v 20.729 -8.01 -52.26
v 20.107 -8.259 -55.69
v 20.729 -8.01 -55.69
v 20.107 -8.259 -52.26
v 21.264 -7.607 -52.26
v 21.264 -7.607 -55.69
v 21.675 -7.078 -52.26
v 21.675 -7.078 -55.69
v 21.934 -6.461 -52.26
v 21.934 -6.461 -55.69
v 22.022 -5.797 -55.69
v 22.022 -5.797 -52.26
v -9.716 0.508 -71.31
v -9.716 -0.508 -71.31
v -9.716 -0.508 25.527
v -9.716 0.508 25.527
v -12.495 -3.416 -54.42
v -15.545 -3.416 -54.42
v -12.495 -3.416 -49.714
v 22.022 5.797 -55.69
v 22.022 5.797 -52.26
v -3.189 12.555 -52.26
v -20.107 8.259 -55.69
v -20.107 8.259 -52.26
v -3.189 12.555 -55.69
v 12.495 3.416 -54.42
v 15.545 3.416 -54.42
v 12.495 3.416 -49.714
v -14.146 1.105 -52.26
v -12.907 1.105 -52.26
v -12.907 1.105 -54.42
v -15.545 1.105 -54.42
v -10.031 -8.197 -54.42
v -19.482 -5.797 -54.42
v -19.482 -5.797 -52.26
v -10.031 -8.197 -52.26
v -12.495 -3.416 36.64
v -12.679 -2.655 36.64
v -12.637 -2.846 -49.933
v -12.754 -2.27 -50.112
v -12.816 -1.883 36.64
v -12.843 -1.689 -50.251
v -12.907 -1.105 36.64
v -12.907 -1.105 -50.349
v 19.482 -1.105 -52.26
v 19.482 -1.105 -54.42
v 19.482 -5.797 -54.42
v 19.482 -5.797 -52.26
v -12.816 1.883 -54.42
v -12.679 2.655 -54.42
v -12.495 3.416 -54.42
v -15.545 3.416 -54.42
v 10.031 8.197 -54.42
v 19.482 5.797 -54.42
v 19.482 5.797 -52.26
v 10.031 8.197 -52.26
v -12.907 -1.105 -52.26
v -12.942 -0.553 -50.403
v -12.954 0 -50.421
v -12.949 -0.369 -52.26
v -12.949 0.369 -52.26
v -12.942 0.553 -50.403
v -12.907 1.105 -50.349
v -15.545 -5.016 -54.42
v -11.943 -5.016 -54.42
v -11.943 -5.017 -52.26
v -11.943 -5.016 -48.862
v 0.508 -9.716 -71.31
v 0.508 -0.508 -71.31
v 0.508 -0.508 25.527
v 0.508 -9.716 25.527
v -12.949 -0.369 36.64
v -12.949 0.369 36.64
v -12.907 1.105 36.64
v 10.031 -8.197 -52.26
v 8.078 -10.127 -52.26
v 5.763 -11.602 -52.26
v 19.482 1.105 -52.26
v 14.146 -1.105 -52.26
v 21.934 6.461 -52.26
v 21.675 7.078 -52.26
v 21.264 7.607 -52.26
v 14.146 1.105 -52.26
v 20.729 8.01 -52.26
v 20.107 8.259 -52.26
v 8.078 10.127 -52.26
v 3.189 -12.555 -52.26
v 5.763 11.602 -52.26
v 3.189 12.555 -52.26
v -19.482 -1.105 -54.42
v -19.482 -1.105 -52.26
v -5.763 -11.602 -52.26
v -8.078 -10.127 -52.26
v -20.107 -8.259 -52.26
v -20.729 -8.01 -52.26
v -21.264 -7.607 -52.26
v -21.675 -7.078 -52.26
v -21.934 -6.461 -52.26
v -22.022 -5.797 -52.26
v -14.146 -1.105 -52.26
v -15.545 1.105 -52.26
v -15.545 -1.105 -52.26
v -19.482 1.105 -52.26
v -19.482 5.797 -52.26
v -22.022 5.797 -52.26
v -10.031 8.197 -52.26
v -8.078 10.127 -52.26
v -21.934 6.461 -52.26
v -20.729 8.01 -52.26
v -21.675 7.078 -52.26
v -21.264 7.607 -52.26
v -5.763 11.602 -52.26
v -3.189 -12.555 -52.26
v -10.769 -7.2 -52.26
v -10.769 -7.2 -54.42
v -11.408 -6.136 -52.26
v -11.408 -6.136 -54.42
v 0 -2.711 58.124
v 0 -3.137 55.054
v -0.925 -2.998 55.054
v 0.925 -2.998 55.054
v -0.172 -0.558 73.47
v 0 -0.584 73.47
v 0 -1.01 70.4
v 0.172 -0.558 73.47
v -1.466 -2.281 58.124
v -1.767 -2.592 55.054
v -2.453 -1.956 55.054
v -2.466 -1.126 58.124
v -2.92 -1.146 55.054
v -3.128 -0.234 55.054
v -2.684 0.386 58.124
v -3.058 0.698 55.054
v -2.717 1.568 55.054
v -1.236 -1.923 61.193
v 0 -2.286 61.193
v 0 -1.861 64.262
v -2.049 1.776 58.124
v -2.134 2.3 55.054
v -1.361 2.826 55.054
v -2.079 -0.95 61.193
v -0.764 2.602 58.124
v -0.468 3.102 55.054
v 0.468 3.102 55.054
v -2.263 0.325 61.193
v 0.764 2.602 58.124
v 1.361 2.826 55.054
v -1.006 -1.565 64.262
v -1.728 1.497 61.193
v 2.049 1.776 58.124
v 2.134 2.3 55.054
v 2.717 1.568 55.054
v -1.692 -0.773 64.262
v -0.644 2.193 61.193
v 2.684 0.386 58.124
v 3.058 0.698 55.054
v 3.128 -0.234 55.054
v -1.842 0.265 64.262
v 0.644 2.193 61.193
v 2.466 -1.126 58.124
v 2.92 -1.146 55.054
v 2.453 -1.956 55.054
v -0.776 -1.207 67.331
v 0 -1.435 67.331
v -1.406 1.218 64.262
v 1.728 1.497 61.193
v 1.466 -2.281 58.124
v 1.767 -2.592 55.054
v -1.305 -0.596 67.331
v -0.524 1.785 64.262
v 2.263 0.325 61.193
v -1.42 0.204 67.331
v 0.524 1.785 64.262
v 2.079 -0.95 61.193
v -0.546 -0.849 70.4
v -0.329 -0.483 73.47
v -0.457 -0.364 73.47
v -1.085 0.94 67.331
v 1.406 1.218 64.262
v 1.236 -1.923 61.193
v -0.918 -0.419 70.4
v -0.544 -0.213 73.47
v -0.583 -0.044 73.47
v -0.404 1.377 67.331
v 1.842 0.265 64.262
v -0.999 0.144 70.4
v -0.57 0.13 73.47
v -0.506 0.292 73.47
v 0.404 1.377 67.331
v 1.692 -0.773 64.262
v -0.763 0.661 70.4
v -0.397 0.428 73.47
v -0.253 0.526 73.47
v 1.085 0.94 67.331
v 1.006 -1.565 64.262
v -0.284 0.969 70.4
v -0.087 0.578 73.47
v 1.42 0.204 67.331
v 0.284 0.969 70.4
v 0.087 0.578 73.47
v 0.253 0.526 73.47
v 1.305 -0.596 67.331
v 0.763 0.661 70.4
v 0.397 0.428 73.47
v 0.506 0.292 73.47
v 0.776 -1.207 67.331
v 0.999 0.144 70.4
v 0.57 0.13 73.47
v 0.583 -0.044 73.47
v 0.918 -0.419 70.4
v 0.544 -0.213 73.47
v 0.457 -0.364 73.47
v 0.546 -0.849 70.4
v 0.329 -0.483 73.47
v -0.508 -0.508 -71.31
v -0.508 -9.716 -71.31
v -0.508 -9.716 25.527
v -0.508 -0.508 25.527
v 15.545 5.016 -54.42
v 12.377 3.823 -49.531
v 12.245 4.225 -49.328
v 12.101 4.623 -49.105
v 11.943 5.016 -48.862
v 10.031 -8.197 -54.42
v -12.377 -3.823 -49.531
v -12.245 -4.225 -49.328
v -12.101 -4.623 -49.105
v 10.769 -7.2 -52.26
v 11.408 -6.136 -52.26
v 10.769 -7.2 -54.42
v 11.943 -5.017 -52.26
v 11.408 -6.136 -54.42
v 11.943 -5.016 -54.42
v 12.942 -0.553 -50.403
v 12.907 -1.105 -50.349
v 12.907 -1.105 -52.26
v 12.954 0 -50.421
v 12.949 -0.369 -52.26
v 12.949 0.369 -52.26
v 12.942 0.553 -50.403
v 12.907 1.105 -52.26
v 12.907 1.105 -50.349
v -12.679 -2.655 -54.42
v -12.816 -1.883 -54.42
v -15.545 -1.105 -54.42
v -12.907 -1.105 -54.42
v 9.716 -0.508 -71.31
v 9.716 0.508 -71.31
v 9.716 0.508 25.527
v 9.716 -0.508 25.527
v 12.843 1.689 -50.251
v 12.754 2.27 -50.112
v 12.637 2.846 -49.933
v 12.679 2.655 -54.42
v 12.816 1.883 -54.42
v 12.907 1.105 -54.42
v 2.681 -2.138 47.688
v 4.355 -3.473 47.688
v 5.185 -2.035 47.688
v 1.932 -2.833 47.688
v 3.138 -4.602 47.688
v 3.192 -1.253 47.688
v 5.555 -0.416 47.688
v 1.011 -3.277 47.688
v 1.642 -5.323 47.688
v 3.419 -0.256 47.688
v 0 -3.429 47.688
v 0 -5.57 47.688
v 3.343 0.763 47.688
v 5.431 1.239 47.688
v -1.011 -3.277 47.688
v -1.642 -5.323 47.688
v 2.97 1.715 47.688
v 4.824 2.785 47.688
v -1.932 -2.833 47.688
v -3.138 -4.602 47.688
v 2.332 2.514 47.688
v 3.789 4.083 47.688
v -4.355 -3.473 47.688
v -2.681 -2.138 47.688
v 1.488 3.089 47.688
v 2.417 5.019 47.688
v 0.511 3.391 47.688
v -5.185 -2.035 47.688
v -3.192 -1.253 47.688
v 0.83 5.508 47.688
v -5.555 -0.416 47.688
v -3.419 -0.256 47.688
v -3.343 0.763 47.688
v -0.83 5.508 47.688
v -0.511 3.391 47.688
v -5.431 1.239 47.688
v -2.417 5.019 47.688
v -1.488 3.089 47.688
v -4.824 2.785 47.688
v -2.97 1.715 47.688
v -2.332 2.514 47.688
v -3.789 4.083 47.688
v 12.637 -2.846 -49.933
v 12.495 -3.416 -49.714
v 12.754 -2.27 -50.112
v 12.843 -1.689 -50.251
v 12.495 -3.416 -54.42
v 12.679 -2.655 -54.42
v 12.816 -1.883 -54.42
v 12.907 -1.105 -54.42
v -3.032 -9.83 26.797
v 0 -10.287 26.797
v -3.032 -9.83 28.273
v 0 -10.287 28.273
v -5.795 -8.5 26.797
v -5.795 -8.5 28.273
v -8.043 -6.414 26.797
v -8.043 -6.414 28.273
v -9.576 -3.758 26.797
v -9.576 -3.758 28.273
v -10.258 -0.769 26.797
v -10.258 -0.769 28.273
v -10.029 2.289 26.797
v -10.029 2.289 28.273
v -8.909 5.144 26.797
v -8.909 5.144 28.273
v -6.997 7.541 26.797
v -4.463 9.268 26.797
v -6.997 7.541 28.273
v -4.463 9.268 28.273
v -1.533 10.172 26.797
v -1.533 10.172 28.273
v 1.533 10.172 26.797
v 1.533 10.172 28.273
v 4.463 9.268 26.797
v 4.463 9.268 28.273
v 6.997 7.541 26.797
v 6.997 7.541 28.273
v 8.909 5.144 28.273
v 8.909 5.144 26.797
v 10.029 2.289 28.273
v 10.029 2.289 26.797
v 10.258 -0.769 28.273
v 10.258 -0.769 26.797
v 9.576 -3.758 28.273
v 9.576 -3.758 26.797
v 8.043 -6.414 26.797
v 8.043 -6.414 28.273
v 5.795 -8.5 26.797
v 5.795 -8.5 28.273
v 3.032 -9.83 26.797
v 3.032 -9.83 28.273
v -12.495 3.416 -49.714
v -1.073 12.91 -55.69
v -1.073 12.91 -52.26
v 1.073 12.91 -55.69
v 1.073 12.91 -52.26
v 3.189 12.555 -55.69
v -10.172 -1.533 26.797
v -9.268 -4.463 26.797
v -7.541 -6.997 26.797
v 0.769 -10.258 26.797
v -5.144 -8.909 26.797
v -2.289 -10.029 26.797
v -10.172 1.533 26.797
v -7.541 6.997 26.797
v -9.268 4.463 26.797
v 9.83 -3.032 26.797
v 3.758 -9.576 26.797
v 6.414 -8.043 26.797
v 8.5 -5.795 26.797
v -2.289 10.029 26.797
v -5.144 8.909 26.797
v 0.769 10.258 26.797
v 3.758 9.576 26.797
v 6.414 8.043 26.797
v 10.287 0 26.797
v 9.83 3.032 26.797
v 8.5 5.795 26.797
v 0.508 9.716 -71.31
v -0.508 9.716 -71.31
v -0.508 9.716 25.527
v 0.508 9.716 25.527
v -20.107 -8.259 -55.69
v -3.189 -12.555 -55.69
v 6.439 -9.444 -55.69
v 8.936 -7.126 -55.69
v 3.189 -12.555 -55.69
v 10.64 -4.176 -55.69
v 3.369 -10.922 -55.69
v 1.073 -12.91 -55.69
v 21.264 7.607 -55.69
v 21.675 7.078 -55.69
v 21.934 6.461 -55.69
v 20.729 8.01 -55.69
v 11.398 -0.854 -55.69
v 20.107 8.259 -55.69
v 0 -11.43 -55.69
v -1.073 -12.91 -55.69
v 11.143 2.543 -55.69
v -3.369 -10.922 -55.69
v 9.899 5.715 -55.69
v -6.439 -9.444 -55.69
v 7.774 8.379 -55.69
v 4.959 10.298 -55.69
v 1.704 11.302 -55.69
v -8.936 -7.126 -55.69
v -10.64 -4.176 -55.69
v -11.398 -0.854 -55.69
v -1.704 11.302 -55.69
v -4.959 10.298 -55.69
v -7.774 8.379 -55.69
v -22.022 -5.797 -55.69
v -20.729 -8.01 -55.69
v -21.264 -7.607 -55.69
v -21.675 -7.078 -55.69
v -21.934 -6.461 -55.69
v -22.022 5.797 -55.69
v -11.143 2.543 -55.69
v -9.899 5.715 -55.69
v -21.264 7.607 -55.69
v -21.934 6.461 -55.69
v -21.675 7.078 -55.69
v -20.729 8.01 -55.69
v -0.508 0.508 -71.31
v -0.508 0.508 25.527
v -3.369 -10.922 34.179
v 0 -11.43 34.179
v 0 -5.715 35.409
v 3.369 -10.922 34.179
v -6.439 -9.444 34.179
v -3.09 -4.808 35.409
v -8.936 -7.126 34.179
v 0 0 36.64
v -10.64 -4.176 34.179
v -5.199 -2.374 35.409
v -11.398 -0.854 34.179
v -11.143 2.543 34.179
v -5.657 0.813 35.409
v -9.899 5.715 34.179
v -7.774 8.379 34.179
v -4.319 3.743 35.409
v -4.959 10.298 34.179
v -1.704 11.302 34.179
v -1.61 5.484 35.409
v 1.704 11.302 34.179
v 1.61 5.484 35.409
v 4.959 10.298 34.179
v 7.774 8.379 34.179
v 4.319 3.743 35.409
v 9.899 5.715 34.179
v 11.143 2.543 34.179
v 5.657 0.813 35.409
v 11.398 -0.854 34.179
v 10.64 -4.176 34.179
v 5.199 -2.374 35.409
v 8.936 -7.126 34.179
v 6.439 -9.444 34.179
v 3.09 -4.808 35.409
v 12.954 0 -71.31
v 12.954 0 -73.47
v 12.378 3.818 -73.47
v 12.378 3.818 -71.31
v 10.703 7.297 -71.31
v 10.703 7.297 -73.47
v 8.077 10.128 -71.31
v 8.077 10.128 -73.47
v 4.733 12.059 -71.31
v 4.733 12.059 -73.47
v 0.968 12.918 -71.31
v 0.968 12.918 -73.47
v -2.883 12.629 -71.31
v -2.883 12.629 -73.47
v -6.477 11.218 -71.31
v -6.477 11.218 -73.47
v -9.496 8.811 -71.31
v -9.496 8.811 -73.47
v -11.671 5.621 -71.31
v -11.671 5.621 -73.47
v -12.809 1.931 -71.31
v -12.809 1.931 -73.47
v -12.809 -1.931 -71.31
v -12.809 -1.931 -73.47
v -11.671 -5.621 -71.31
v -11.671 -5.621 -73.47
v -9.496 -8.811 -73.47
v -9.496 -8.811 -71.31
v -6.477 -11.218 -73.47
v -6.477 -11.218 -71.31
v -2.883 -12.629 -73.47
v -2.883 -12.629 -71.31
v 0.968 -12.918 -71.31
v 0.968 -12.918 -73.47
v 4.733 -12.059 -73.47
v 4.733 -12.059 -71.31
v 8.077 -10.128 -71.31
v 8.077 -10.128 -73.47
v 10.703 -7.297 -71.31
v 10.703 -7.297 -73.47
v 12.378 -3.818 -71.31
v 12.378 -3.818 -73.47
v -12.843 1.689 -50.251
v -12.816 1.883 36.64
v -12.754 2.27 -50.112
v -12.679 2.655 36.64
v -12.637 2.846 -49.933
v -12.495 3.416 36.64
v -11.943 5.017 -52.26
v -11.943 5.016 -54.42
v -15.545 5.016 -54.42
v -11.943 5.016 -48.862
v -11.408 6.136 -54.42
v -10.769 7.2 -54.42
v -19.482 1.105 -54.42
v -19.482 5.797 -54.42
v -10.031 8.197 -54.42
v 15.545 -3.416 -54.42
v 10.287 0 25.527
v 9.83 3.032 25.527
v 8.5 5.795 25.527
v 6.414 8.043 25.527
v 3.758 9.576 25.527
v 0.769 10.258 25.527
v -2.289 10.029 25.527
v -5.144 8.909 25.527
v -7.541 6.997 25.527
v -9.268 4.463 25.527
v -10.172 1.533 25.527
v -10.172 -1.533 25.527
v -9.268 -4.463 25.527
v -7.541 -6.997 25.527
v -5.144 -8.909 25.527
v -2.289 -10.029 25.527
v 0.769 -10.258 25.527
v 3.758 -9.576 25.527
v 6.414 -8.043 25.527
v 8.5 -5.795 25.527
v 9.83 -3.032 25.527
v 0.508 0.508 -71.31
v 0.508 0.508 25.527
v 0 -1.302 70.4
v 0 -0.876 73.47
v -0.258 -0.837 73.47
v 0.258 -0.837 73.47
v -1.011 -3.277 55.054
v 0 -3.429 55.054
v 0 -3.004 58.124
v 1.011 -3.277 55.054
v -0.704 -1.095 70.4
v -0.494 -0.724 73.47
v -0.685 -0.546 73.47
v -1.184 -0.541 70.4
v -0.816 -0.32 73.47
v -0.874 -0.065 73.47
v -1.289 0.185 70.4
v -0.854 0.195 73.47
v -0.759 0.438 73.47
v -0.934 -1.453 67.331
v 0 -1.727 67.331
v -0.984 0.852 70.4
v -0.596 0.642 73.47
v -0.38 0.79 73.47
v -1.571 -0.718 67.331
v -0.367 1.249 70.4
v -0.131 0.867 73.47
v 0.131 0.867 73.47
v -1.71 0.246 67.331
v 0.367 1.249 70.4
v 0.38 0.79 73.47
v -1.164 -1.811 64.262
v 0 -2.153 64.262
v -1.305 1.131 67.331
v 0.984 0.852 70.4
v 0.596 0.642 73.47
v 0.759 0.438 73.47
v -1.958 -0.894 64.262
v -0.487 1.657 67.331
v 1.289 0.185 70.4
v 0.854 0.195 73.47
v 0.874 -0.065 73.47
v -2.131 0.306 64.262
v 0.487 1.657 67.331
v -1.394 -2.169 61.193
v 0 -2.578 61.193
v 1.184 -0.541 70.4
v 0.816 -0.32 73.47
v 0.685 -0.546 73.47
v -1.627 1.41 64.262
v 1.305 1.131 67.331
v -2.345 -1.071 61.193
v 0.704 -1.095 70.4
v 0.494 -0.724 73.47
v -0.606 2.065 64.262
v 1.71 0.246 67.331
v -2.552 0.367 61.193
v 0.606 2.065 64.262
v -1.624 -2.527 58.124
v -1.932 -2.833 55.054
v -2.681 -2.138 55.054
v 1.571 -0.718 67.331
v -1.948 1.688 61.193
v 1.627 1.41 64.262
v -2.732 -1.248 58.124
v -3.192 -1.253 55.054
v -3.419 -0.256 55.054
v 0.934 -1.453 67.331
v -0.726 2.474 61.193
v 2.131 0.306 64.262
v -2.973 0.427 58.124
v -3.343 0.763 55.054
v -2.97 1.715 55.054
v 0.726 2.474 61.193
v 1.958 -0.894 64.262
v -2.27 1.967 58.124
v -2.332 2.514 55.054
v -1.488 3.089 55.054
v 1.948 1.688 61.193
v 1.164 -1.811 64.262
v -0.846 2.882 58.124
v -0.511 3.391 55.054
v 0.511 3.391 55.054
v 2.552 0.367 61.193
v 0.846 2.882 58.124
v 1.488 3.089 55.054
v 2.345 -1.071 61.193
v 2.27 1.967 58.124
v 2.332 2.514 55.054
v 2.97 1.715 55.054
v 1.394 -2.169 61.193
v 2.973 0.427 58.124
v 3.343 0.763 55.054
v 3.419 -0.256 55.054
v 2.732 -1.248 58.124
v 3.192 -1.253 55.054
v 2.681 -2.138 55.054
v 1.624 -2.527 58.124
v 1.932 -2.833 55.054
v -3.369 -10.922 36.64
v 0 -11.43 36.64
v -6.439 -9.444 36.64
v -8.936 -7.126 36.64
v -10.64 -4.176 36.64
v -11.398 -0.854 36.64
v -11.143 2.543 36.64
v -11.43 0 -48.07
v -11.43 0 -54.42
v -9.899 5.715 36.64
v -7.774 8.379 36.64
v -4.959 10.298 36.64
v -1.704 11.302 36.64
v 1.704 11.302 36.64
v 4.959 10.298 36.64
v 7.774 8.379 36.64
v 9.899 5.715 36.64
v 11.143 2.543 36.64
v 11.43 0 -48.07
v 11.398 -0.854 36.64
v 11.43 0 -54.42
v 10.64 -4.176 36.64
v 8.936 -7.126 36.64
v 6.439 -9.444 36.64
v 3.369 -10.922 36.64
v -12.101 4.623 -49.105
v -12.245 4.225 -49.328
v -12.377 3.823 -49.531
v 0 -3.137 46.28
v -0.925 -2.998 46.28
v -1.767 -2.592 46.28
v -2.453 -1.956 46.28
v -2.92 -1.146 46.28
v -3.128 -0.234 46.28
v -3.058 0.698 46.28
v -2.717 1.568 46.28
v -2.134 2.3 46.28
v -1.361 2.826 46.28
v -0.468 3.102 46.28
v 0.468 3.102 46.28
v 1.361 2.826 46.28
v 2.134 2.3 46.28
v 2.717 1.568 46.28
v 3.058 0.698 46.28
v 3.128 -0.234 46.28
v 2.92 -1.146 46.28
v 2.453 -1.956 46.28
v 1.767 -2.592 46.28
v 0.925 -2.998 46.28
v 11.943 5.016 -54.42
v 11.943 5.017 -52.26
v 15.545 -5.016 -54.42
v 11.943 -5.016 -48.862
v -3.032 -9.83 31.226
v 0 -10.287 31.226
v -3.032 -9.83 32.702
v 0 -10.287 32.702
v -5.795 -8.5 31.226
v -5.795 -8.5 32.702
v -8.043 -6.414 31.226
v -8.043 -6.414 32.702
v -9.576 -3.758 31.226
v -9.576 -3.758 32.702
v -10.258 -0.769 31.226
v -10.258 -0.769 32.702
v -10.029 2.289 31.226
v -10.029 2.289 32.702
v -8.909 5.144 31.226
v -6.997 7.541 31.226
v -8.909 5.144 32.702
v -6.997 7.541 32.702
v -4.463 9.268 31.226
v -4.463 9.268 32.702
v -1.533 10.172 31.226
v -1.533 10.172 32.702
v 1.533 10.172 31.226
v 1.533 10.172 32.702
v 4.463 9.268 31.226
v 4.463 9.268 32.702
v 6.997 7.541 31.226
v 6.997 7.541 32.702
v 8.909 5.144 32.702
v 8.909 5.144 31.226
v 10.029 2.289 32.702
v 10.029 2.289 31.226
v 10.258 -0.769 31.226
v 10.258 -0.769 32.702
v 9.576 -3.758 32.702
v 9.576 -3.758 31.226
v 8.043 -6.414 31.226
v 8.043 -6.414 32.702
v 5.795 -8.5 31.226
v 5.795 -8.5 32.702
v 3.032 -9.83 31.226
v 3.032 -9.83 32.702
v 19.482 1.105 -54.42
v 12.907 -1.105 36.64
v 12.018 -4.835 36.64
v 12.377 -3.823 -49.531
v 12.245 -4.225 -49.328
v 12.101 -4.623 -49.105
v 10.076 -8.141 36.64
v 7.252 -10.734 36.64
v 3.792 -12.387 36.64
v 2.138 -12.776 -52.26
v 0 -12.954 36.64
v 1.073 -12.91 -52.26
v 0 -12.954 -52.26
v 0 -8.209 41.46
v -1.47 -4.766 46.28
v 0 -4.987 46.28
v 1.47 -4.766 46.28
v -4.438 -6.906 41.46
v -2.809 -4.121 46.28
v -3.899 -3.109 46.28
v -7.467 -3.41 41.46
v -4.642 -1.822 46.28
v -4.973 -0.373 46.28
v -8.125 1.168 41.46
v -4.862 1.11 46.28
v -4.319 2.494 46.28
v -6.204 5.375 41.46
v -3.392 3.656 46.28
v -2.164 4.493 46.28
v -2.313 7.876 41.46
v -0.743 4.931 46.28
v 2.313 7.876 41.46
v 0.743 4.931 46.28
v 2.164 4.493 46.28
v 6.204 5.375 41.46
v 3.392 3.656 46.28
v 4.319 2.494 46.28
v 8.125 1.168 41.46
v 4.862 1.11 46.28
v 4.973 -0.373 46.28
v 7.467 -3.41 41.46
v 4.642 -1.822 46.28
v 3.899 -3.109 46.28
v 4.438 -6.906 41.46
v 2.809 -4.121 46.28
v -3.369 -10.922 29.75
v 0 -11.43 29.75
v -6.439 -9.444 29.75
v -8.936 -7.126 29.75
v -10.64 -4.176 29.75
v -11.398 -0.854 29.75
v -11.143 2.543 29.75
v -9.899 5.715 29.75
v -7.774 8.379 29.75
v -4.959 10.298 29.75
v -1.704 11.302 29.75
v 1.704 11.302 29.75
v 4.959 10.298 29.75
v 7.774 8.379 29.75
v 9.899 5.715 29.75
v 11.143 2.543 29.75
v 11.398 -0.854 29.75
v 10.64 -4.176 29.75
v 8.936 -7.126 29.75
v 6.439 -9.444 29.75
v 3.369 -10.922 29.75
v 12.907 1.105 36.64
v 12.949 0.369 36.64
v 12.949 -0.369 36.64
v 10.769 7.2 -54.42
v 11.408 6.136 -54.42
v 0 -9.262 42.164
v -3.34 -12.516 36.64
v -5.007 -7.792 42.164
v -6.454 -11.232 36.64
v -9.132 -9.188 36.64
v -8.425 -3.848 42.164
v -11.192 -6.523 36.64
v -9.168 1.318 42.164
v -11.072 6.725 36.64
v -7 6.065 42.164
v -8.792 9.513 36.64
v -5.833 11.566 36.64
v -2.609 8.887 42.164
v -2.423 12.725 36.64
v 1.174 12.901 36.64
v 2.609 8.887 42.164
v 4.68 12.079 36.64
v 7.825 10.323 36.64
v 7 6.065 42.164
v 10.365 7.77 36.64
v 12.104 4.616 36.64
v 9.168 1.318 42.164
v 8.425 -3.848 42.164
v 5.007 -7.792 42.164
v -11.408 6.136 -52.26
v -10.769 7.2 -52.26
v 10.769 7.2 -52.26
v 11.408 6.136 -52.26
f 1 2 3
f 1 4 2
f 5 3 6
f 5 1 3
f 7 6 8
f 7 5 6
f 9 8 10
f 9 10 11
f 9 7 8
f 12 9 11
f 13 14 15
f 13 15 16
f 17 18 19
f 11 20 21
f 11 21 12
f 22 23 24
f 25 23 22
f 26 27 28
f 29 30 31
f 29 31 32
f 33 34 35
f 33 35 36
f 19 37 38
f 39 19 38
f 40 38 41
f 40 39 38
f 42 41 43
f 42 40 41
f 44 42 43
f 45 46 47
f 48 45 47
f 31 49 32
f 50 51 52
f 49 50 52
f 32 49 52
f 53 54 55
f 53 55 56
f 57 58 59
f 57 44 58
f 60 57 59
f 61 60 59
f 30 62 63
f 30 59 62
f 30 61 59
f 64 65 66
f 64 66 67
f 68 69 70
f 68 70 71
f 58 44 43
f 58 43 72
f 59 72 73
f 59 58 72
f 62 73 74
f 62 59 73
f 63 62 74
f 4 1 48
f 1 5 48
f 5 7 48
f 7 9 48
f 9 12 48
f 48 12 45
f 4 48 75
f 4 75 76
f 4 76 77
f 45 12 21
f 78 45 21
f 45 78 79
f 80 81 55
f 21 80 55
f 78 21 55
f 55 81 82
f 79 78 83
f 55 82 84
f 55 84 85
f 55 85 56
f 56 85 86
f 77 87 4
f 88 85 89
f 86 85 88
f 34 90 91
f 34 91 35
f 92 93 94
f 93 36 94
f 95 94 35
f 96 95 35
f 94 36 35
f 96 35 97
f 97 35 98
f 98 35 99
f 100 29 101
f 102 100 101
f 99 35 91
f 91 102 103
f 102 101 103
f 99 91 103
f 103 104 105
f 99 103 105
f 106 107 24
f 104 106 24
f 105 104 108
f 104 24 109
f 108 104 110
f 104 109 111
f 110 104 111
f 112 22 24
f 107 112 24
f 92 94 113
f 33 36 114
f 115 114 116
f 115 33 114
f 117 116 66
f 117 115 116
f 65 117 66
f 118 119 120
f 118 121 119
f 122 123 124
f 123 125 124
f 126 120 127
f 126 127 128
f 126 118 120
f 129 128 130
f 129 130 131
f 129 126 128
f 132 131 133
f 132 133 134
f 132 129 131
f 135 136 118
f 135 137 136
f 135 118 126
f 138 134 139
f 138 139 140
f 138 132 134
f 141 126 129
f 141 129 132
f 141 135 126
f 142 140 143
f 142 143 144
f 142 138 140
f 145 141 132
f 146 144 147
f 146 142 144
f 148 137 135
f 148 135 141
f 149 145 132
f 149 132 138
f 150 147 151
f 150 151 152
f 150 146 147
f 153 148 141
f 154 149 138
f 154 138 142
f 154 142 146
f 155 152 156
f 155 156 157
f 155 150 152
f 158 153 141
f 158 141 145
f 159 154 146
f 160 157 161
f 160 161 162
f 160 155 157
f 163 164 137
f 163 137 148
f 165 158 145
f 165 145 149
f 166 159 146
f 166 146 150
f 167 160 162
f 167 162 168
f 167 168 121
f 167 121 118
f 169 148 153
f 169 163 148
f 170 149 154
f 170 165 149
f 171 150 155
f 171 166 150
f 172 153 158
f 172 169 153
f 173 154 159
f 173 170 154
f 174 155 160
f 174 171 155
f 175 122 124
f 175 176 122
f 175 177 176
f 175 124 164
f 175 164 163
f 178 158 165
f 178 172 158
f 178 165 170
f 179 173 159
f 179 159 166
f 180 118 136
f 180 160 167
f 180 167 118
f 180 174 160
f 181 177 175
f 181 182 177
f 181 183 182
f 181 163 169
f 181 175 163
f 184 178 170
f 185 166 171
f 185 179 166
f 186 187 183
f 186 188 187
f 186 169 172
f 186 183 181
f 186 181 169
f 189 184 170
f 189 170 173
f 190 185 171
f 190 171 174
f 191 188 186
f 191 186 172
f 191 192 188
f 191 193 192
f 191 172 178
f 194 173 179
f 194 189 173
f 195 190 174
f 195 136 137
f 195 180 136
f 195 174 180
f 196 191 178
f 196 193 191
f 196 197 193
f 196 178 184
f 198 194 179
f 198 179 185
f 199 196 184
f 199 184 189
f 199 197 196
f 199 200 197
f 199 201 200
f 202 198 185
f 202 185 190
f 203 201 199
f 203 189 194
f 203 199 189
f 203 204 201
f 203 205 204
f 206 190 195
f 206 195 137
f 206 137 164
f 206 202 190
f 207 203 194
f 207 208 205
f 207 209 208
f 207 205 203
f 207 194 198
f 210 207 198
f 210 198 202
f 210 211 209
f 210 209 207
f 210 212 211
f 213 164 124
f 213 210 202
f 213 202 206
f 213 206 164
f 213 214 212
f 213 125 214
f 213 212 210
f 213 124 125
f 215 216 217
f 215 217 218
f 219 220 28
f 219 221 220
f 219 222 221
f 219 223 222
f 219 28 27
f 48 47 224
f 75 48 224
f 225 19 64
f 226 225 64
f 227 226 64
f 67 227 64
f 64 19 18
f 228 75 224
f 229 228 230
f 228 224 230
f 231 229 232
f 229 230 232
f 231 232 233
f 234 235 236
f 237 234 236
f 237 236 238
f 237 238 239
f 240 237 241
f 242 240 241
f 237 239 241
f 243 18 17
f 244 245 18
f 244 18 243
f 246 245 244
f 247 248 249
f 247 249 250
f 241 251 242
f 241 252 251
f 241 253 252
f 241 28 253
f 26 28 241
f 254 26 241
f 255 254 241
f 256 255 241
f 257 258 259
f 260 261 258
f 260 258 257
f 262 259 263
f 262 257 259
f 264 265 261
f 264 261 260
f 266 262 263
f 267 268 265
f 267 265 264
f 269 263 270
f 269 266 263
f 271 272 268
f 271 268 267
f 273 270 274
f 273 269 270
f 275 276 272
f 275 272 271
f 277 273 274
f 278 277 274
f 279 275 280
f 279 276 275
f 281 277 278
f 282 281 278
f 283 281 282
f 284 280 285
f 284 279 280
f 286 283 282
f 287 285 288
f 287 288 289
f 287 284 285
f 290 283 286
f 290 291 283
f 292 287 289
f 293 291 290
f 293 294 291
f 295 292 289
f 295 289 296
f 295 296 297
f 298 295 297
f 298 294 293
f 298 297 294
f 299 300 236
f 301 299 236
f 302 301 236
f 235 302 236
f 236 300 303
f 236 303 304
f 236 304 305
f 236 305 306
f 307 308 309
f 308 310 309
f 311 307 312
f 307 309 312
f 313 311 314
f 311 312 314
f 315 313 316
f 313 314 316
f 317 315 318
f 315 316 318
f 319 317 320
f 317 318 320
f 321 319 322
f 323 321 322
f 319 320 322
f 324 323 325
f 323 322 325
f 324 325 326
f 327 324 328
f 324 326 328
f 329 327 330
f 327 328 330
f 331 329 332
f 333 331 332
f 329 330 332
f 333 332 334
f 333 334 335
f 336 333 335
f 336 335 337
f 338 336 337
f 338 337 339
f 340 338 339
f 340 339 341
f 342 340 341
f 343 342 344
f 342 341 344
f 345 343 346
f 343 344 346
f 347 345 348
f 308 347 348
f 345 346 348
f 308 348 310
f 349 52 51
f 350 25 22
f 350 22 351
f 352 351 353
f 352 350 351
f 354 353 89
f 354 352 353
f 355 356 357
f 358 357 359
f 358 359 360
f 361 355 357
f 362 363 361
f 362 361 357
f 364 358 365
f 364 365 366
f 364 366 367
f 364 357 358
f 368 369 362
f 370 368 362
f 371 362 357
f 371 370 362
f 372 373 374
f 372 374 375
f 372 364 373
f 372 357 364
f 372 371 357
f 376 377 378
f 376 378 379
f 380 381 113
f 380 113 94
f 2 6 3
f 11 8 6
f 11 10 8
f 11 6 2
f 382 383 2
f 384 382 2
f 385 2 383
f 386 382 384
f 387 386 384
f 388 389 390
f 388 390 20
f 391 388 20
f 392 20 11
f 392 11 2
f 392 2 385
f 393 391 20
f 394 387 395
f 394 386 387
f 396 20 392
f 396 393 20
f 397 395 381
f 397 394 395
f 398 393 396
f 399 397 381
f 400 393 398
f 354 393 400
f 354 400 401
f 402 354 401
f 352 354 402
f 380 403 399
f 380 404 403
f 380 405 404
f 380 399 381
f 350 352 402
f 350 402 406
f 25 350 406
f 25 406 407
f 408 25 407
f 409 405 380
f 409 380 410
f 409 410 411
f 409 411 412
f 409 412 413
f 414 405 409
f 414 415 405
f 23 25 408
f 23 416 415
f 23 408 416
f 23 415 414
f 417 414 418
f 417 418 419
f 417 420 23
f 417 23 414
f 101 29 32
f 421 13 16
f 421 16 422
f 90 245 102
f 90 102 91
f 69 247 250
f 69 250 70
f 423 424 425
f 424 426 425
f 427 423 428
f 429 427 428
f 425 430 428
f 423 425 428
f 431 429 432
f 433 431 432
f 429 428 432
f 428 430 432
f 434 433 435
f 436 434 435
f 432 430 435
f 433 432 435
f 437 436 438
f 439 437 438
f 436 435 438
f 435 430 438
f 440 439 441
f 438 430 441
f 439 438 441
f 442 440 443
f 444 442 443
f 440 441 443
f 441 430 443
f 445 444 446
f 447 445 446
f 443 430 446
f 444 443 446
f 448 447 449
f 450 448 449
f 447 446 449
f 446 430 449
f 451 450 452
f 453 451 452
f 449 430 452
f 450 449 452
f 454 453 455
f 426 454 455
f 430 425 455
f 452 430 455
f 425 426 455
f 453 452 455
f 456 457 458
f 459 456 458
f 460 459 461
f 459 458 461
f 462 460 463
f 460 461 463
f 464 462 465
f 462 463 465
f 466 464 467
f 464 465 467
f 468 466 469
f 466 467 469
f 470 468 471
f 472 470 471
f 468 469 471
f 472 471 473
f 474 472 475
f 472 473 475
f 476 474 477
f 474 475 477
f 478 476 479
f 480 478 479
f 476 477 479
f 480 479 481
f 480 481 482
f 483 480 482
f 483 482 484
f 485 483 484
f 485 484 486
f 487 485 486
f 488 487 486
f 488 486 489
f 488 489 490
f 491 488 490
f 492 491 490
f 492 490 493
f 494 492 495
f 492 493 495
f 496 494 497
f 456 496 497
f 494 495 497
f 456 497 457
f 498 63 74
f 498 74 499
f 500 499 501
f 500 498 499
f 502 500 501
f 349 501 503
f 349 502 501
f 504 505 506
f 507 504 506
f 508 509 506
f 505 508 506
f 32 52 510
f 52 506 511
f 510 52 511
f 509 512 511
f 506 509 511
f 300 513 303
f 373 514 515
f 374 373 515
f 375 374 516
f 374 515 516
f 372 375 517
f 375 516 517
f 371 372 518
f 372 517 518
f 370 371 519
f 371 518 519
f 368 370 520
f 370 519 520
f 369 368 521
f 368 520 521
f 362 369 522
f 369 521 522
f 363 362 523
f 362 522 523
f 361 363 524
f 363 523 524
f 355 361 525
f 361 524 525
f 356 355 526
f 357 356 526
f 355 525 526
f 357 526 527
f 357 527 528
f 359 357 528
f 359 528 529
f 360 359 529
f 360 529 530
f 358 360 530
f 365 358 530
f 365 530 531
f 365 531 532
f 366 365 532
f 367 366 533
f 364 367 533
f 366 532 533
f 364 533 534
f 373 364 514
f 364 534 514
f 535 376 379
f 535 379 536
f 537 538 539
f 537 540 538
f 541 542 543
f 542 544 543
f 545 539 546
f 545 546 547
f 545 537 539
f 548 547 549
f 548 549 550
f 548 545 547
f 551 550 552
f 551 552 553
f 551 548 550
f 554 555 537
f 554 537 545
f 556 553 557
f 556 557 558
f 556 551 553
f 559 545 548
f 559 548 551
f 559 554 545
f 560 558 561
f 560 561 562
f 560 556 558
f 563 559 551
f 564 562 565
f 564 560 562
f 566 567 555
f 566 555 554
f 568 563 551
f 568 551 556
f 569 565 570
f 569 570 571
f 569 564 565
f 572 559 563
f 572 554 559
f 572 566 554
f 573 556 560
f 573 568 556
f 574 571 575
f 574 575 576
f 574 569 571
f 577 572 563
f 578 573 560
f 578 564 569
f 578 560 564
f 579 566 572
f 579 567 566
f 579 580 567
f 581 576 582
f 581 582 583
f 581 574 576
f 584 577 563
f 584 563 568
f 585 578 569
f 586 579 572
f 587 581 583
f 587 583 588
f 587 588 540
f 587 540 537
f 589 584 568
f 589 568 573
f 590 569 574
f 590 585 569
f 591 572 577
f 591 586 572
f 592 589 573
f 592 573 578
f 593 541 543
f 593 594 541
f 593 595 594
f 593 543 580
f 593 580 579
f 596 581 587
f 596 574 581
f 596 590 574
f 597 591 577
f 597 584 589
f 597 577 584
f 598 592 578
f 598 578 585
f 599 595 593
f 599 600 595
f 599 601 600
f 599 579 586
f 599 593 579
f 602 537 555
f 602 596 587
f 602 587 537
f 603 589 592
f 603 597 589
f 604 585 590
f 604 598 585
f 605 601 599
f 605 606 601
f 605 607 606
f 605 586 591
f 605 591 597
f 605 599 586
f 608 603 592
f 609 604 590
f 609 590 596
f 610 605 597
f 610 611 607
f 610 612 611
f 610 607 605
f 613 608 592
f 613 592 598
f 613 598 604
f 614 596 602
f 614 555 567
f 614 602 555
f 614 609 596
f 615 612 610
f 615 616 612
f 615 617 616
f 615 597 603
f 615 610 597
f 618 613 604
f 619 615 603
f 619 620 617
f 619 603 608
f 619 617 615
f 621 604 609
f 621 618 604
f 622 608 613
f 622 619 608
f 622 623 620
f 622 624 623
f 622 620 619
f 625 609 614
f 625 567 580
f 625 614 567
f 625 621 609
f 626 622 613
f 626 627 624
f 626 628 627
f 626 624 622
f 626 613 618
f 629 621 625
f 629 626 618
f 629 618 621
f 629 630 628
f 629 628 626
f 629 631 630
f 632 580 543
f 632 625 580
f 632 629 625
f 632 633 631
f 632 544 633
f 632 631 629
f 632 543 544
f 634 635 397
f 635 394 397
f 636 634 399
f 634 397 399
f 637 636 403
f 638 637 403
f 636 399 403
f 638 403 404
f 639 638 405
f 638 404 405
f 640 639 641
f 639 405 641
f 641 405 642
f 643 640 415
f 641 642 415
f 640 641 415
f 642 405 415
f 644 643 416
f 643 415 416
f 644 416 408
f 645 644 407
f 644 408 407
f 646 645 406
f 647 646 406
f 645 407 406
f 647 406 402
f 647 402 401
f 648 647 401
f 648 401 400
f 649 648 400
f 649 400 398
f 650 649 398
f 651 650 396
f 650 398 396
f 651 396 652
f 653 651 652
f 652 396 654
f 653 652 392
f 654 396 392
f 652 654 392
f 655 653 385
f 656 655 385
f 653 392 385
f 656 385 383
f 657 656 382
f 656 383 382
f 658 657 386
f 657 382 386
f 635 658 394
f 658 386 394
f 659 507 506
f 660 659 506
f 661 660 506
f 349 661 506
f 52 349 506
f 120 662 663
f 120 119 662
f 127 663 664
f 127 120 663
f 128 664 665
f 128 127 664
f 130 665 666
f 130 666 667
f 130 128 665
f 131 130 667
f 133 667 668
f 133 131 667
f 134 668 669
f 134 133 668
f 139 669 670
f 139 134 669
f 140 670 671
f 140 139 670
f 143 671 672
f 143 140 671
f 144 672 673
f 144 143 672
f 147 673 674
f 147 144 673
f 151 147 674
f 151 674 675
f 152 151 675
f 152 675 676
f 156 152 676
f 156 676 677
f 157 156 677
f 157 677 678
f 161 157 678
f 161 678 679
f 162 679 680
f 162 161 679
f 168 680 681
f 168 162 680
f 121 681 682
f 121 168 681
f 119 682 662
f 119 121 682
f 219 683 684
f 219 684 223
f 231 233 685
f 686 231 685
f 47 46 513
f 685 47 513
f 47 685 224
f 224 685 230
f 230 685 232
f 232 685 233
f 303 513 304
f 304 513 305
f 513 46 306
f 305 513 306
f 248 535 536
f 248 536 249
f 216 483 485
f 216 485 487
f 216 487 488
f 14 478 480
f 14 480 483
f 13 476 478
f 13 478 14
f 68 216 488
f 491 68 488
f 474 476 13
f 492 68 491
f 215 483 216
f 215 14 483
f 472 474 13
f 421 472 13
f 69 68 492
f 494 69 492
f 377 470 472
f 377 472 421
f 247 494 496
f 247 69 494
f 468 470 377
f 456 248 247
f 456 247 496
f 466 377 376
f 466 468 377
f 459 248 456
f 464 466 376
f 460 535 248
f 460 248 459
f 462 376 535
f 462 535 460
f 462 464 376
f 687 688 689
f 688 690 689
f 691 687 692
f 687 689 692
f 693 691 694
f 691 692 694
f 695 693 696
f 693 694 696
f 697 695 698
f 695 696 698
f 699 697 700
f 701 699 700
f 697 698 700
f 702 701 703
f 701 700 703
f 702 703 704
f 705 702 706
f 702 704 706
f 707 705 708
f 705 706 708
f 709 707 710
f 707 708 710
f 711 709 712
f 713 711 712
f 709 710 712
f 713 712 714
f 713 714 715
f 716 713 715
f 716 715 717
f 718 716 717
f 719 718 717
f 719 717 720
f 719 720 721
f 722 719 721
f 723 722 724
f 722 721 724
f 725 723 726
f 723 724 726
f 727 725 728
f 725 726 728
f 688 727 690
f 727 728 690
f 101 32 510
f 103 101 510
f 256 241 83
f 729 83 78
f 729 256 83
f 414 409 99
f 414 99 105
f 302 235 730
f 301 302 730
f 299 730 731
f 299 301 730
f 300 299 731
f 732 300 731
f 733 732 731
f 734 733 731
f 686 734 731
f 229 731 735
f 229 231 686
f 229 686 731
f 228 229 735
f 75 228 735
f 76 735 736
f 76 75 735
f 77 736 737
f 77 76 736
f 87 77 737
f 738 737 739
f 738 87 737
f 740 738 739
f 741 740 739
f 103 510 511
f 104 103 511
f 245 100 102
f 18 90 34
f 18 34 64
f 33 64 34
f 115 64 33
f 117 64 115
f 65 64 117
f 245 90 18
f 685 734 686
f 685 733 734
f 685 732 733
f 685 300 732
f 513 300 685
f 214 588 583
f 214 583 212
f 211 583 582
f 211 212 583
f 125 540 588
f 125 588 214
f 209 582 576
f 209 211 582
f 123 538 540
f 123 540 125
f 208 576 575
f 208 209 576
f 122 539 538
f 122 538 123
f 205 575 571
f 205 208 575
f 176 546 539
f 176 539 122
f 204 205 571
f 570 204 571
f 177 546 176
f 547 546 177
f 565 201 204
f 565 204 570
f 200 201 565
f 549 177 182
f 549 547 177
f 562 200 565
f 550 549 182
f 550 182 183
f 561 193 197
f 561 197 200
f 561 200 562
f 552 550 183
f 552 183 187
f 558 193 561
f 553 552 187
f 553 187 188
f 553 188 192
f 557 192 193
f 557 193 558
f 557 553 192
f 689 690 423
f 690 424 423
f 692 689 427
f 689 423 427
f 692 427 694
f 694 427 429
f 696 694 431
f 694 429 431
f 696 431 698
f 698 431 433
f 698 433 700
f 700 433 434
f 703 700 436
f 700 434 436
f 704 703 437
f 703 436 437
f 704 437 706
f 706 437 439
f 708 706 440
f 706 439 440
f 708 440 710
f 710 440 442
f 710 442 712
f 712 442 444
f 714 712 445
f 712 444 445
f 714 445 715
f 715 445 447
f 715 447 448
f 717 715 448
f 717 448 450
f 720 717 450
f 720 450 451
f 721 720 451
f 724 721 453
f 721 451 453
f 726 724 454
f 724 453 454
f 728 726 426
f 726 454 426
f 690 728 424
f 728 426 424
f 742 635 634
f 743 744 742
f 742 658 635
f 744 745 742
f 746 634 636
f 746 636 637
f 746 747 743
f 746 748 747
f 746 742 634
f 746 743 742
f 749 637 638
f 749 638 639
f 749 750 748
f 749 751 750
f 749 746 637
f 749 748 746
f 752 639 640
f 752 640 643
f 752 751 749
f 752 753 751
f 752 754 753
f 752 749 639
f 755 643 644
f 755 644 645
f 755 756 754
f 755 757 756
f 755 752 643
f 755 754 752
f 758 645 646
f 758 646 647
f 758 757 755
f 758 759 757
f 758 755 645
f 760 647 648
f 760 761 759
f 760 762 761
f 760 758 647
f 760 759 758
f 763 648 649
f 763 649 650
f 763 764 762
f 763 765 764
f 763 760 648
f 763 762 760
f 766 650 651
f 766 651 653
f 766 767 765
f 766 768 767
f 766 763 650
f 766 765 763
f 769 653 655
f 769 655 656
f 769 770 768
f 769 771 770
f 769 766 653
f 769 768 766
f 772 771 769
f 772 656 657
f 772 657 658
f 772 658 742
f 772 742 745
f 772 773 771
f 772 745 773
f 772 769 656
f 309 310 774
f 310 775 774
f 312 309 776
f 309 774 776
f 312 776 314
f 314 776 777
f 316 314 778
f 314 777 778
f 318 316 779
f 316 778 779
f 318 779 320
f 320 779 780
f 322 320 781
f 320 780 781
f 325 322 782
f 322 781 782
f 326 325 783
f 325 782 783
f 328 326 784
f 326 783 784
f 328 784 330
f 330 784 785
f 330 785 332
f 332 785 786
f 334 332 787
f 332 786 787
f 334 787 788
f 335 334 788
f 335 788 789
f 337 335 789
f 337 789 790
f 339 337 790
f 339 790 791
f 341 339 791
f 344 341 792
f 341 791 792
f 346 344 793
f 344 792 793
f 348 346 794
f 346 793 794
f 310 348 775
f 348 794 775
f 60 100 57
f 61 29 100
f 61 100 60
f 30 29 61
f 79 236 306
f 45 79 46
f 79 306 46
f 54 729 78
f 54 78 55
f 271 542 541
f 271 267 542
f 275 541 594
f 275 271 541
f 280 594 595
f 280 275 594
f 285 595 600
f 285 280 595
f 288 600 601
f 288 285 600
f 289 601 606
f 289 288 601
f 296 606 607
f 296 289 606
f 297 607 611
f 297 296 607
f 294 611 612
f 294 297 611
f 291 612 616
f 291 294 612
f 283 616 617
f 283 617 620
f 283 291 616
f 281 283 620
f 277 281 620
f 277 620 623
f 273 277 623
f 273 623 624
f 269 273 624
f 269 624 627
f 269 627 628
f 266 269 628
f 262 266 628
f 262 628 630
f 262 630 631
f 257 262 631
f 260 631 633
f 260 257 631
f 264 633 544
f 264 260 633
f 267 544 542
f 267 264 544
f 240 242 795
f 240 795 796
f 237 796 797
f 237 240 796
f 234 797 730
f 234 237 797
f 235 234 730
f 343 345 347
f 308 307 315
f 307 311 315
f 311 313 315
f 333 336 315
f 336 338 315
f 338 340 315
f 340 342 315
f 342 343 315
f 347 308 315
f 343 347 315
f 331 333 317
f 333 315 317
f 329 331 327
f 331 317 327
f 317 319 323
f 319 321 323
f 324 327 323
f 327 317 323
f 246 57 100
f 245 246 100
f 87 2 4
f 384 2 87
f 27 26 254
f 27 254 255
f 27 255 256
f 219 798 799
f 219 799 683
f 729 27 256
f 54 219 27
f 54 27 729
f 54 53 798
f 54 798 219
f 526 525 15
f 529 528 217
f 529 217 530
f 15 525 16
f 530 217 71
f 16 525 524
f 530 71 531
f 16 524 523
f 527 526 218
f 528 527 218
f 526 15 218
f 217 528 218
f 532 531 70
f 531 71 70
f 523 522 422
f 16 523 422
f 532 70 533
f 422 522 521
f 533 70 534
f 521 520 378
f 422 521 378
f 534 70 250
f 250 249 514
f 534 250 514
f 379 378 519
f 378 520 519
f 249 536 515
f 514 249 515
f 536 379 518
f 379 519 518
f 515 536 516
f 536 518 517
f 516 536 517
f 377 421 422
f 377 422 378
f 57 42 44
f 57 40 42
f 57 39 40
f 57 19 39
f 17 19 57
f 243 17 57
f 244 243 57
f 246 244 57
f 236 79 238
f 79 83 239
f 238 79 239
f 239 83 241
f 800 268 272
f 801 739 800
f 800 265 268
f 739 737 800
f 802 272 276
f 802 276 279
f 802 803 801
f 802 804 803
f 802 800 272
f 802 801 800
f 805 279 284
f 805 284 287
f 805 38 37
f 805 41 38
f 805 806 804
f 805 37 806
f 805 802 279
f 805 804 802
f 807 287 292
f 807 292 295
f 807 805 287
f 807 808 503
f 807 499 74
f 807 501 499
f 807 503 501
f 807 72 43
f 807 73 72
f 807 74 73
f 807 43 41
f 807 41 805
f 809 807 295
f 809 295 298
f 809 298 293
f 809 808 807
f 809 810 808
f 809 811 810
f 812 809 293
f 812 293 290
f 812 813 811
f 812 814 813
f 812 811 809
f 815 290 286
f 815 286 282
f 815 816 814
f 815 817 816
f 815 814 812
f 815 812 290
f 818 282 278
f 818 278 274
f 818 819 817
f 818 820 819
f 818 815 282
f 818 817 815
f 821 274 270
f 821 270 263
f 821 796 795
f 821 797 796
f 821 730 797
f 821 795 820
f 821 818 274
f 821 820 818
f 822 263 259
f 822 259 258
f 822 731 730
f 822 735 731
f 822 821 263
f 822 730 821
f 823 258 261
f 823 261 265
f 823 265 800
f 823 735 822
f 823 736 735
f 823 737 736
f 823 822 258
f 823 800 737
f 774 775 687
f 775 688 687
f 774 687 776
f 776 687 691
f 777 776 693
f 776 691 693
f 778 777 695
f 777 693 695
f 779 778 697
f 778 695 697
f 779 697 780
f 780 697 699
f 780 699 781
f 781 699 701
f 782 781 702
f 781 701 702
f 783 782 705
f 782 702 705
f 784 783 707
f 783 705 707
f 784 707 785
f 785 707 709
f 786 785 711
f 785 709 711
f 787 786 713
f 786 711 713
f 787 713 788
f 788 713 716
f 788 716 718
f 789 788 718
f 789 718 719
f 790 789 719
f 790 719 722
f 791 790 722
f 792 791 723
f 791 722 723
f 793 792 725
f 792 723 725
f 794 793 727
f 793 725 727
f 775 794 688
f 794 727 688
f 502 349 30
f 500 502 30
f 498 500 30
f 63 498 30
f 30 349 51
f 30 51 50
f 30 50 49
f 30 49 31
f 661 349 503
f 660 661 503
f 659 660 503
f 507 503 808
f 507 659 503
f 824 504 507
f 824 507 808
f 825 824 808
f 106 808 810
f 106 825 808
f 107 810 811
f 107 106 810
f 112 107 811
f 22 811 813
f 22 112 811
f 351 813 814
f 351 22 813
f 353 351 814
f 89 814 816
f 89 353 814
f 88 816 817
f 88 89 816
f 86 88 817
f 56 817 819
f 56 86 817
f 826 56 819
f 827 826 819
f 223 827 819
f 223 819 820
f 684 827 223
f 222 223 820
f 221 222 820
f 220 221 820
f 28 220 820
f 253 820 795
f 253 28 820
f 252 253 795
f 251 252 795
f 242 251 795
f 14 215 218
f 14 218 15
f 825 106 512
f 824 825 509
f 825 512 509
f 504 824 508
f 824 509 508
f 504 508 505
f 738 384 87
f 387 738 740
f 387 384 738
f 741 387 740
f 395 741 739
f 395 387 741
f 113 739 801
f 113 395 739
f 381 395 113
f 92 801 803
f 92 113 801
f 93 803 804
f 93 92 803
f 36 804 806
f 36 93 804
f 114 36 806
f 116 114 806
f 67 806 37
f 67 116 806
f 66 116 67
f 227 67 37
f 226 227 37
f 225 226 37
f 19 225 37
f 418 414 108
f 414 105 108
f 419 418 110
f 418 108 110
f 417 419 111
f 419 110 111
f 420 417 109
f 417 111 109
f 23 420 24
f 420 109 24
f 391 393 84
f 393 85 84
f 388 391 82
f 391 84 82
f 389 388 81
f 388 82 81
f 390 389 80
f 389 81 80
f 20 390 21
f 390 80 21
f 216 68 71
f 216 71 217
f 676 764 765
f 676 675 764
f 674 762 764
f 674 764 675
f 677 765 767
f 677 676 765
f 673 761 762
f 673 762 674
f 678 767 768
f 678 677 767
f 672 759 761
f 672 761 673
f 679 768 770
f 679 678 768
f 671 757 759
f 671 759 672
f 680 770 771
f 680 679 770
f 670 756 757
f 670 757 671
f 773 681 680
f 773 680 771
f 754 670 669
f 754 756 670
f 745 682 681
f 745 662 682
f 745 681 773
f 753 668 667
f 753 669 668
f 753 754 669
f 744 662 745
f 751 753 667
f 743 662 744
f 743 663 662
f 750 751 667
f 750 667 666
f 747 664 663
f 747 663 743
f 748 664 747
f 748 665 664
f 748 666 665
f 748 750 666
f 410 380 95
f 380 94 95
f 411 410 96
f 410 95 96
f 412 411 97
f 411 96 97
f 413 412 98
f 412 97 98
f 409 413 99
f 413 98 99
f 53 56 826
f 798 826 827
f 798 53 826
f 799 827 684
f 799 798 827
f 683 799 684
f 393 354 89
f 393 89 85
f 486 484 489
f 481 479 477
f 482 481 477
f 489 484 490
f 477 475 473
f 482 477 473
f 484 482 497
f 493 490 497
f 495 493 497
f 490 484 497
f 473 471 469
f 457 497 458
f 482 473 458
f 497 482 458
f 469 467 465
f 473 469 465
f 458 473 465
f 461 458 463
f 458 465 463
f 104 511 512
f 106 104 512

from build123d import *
from build123d.topology import SkipClean

# Parameters (mm, degrees)
BOSS_EXTRUDE1_START = 3.429
SKETCH3_R           = 11.43
BOSS_EXTRUDE1_DEPTH = 3.429
FILLET1_R           = 2.54
SKETCH5_R           = 12.954
BOSS_EXTRUDE2_DEPTH = 2.159
BOSS_EXTRUDE3_DEPTH = 96.8375
SKETCH7_R           = 10.287
BOSS_EXTRUDE4_DEPTH = 1.27
CUT_EXTRUDE1_START  = -2.159
CUT_EXTRUDE1_DEPTH  = 2.159
BOSS_EXTRUDE5_DEPTH = 5.0165
CUT_EXTRUDE2_DEPTH  = 131.416111398
CUT_EXTRUDE3_DEPTH  = 129.299644159


with BuildPart() as part:
    # Sketch2 → Revolve1 (revolve)
    with BuildSketch(Plane(origin=(0, 0, 0), x_dir=(0, 0, -1), z_dir=(1, 0, 0)), mode=Mode.PRIVATE) as revolve1_sk:
        Polygon((52.2605, 11.43), (-36.6395, 11.43), (-46.280429208, 4.987199723), (-46.280429208, 3.1369), (-55.0545, 3.1369), (-73.4695, 0.5842), (-73.4695, 0.8763), (-55.0545, 3.429), (-47.6885, 3.429), (-47.6885, 5.57022), (-36.6395, 12.954), (52.2605, 12.954), align=None)
    revolve(revolve1_sk.sketch.rotate(Axis((0, 0, 73.4695), (0, 0, -1)), 180), axis=Axis((0, 0, 73.4695), (0, 0, -1)))

    # Sketch3 → Boss-Extrude1 (add)
    with BuildSketch(Plane(origin=(0, 0, -52.2605), x_dir=(-1, 0, 0), z_dir=(0, 0, -1)).offset(BOSS_EXTRUDE1_START)):
        with BuildLine():
            Line((-3.188676923, 12.555415385), (-22.0218, 7.7724))
            Line((-22.0218, 7.7724), (-22.0218, -7.7724))
            Line((-22.0218, -7.7724), (-3.188676923, -12.555415385))
            ThreePointArc((-3.188676923, -12.555415385), (0, -12.954), (3.188676923, -12.555415385))
            Line((3.188676923, -12.555415385), (22.0218, -7.7724))
            Line((22.0218, -7.7724), (22.0218, 7.7724))
            Line((22.0218, 7.7724), (3.188676923, 12.555415385))
            ThreePointArc((3.188676923, 12.555415385), (0, 12.954), (-3.188676923, 12.555415385))
        make_face()
        with Locations(Location((0, 0, 0), (0, 0, 270))):
            Circle(SKETCH3_R, mode=Mode.SUBTRACT)
    extrude(amount=-BOSS_EXTRUDE1_DEPTH)

    # Fillet1
    fillet1_edges = [part.edges().sort_by_distance(p)[0] for p in [
        (22.0218, 7.7724, -53.975),
        (22.0218, -7.7724, -53.975),
        (-22.0218, -7.7724, -53.975),
        (-22.0218, 7.7724, -53.975),
    ]]
    fillet(fillet1_edges, radius=FILLET1_R)

    # Sketch12 → Cut-Extrude1 (cut)
    with BuildSketch(Plane.XY.offset(-52.2605).offset(CUT_EXTRUDE1_START)):
        with BuildLine():
            Line((19.4818, 5.796844444), (10.030595253, 8.197150412))
            ThreePointArc((10.030595253, 8.197150412), (12.004413847, 4.868281442), (12.90679325, 1.1049))
            Line((12.90679325, 1.1049), (19.4818, 1.1049))
            Line((19.4818, 1.1049), (19.4818, 5.796844444))
        make_face()
        with BuildLine():
            Line((19.4818, -5.796844444), (10.030595253, -8.197150412))
            ThreePointArc((10.030595253, -8.197150412), (12.004413847, -4.868281442), (12.90679325, -1.1049))
            Line((12.90679325, -1.1049), (19.4818, -1.1049))
            Line((19.4818, -1.1049), (19.4818, -5.796844444))
        make_face()
    cut_extrude1 = extrude(amount=CUT_EXTRUDE1_DEPTH, mode=Mode.SUBTRACT)

    # Sketch14 → Boss-Extrude5 (add, symmetric)
    with BuildSketch(Plane(origin=(0, 0, 0), x_dir=(1, 0, 0), z_dir=(0, 1, 0))):
        Polygon((11.43, 54.4195), (11.43, 48.0695), (15.5448, 54.4195), align=None)
    boss_extrude5 = extrude(amount=BOSS_EXTRUDE5_DEPTH, both=True)

    # Sketch15 → Cut-Extrude2 (cut, through all)
    with BuildSketch(Plane.XY.offset(-54.4195)):
        with BuildLine():
            Line((15.5448, 3.4163), (12.495399566, 3.4163))
            ThreePointArc((12.495399566, 3.4163), (12.753567832, 2.269939107), (12.90679325, 1.1049))
            Line((12.90679325, 1.1049), (14.145768, 1.1049))
            Line((14.145768, 1.1049), (15.5448, 1.1049))
            Line((15.5448, 1.1049), (15.5448, 3.4163))
        make_face()
        with BuildLine():
            Line((15.5448, -3.4163), (12.495399566, -3.4163))
            ThreePointArc((12.495399566, -3.4163), (12.753567832, -2.269939107), (12.90679325, -1.1049))
            Line((12.90679325, -1.1049), (14.145768, -1.1049))
            Line((14.145768, -1.1049), (15.5448, -1.1049))
            Line((15.5448, -1.1049), (15.5448, -3.4163))
        make_face()
    cut_extrude2 = extrude(amount=CUT_EXTRUDE2_DEPTH, mode=Mode.SUBTRACT)

    # Sketch16 → Cut-Extrude3 (cut, through all)
    with BuildSketch(Plane.XY.offset(-52.2605)):
        with BuildLine():
            Line((14.145768, -1.1049), (12.90679325, -1.1049))
            ThreePointArc((12.90679325, -1.1049), (12.954, 0), (12.90679325, 1.1049))
            Line((12.90679325, 1.1049), (14.145768, 1.1049))
            Line((14.145768, 1.1049), (14.145768, -1.1049))
        make_face()
    cut_extrude3 = extrude(amount=CUT_EXTRUDE3_DEPTH, mode=Mode.SUBTRACT)

    # Mirror1: Cut-Extrude1, Boss-Extrude5, Cut-Extrude2, Cut-Extrude3 across plane
    with SkipClean():  # the faces are left unmerged after this step: merging them gives an invalid solid
        add(cut_extrude1.mirror(Plane(origin=(0, 0, 0), x_dir=(0, 0, 1), z_dir=(1, 0, 0))), mode=Mode.SUBTRACT)
        add(boss_extrude5.mirror(Plane(origin=(0, 0, 0), x_dir=(0, 0, 1), z_dir=(1, 0, 0))))
        add(cut_extrude2.mirror(Plane(origin=(0, 0, 0), x_dir=(0, 0, 1), z_dir=(1, 0, 0))), mode=Mode.SUBTRACT)
        add(cut_extrude3.mirror(Plane(origin=(0, 0, 0), x_dir=(0, 0, 1), z_dir=(1, 0, 0))), mode=Mode.SUBTRACT)


with BuildPart() as body_2:
    # Sketch5 → Boss-Extrude2 (new body)
    with BuildSketch(Plane.XY.offset(-73.4695)):
        Circle(SKETCH5_R)
    extrude(amount=BOSS_EXTRUDE2_DEPTH)

    # Sketch6 → Boss-Extrude3 (add)
    with BuildSketch(Plane.XY.offset(-71.3105)):
        Polygon((-0.508, 9.7155), (0.508, 9.7155), (0.508, 0.508), (9.7155, 0.508), (9.7155, -0.508), (0.508, -0.508), (0.508, -9.7155), (-0.508, -9.7155), (-0.508, -0.508), (-9.7155, -0.508), (-9.7155, 0.508), (-0.508, 0.508), align=None)
    extrude(amount=BOSS_EXTRUDE3_DEPTH)

    # Sketch7 → Boss-Extrude4 (add)
    with BuildSketch(Plane.XY.offset(25.527)):
        Circle(SKETCH7_R)
    extrude(amount=BOSS_EXTRUDE4_DEPTH)


with BuildPart() as body_3:
    # Sketch8 → Revolve2 (revolve)
    with BuildSketch(Plane(origin=(0, 0, 0), x_dir=(0, 0, -1), z_dir=(1, 0, 0)), mode=Mode.PRIVATE) as revolve2_sk:
        Polygon((-36.6395, 0), (-26.797, 0), (-26.797, 10.287), (-28.273375, 10.287), (-29.74975, 11.43), (-31.226125, 10.287), (-32.7025, 10.287), (-34.178875, 11.43), align=None)
    revolve(revolve2_sk.sketch.rotate(Axis((0, 0, 73.4695), (0, 0, -1)), 180), axis=Axis((0, 0, 73.4695), (0, 0, -1)))


solid = Compound([part.part, body_2.part, body_3.part])
